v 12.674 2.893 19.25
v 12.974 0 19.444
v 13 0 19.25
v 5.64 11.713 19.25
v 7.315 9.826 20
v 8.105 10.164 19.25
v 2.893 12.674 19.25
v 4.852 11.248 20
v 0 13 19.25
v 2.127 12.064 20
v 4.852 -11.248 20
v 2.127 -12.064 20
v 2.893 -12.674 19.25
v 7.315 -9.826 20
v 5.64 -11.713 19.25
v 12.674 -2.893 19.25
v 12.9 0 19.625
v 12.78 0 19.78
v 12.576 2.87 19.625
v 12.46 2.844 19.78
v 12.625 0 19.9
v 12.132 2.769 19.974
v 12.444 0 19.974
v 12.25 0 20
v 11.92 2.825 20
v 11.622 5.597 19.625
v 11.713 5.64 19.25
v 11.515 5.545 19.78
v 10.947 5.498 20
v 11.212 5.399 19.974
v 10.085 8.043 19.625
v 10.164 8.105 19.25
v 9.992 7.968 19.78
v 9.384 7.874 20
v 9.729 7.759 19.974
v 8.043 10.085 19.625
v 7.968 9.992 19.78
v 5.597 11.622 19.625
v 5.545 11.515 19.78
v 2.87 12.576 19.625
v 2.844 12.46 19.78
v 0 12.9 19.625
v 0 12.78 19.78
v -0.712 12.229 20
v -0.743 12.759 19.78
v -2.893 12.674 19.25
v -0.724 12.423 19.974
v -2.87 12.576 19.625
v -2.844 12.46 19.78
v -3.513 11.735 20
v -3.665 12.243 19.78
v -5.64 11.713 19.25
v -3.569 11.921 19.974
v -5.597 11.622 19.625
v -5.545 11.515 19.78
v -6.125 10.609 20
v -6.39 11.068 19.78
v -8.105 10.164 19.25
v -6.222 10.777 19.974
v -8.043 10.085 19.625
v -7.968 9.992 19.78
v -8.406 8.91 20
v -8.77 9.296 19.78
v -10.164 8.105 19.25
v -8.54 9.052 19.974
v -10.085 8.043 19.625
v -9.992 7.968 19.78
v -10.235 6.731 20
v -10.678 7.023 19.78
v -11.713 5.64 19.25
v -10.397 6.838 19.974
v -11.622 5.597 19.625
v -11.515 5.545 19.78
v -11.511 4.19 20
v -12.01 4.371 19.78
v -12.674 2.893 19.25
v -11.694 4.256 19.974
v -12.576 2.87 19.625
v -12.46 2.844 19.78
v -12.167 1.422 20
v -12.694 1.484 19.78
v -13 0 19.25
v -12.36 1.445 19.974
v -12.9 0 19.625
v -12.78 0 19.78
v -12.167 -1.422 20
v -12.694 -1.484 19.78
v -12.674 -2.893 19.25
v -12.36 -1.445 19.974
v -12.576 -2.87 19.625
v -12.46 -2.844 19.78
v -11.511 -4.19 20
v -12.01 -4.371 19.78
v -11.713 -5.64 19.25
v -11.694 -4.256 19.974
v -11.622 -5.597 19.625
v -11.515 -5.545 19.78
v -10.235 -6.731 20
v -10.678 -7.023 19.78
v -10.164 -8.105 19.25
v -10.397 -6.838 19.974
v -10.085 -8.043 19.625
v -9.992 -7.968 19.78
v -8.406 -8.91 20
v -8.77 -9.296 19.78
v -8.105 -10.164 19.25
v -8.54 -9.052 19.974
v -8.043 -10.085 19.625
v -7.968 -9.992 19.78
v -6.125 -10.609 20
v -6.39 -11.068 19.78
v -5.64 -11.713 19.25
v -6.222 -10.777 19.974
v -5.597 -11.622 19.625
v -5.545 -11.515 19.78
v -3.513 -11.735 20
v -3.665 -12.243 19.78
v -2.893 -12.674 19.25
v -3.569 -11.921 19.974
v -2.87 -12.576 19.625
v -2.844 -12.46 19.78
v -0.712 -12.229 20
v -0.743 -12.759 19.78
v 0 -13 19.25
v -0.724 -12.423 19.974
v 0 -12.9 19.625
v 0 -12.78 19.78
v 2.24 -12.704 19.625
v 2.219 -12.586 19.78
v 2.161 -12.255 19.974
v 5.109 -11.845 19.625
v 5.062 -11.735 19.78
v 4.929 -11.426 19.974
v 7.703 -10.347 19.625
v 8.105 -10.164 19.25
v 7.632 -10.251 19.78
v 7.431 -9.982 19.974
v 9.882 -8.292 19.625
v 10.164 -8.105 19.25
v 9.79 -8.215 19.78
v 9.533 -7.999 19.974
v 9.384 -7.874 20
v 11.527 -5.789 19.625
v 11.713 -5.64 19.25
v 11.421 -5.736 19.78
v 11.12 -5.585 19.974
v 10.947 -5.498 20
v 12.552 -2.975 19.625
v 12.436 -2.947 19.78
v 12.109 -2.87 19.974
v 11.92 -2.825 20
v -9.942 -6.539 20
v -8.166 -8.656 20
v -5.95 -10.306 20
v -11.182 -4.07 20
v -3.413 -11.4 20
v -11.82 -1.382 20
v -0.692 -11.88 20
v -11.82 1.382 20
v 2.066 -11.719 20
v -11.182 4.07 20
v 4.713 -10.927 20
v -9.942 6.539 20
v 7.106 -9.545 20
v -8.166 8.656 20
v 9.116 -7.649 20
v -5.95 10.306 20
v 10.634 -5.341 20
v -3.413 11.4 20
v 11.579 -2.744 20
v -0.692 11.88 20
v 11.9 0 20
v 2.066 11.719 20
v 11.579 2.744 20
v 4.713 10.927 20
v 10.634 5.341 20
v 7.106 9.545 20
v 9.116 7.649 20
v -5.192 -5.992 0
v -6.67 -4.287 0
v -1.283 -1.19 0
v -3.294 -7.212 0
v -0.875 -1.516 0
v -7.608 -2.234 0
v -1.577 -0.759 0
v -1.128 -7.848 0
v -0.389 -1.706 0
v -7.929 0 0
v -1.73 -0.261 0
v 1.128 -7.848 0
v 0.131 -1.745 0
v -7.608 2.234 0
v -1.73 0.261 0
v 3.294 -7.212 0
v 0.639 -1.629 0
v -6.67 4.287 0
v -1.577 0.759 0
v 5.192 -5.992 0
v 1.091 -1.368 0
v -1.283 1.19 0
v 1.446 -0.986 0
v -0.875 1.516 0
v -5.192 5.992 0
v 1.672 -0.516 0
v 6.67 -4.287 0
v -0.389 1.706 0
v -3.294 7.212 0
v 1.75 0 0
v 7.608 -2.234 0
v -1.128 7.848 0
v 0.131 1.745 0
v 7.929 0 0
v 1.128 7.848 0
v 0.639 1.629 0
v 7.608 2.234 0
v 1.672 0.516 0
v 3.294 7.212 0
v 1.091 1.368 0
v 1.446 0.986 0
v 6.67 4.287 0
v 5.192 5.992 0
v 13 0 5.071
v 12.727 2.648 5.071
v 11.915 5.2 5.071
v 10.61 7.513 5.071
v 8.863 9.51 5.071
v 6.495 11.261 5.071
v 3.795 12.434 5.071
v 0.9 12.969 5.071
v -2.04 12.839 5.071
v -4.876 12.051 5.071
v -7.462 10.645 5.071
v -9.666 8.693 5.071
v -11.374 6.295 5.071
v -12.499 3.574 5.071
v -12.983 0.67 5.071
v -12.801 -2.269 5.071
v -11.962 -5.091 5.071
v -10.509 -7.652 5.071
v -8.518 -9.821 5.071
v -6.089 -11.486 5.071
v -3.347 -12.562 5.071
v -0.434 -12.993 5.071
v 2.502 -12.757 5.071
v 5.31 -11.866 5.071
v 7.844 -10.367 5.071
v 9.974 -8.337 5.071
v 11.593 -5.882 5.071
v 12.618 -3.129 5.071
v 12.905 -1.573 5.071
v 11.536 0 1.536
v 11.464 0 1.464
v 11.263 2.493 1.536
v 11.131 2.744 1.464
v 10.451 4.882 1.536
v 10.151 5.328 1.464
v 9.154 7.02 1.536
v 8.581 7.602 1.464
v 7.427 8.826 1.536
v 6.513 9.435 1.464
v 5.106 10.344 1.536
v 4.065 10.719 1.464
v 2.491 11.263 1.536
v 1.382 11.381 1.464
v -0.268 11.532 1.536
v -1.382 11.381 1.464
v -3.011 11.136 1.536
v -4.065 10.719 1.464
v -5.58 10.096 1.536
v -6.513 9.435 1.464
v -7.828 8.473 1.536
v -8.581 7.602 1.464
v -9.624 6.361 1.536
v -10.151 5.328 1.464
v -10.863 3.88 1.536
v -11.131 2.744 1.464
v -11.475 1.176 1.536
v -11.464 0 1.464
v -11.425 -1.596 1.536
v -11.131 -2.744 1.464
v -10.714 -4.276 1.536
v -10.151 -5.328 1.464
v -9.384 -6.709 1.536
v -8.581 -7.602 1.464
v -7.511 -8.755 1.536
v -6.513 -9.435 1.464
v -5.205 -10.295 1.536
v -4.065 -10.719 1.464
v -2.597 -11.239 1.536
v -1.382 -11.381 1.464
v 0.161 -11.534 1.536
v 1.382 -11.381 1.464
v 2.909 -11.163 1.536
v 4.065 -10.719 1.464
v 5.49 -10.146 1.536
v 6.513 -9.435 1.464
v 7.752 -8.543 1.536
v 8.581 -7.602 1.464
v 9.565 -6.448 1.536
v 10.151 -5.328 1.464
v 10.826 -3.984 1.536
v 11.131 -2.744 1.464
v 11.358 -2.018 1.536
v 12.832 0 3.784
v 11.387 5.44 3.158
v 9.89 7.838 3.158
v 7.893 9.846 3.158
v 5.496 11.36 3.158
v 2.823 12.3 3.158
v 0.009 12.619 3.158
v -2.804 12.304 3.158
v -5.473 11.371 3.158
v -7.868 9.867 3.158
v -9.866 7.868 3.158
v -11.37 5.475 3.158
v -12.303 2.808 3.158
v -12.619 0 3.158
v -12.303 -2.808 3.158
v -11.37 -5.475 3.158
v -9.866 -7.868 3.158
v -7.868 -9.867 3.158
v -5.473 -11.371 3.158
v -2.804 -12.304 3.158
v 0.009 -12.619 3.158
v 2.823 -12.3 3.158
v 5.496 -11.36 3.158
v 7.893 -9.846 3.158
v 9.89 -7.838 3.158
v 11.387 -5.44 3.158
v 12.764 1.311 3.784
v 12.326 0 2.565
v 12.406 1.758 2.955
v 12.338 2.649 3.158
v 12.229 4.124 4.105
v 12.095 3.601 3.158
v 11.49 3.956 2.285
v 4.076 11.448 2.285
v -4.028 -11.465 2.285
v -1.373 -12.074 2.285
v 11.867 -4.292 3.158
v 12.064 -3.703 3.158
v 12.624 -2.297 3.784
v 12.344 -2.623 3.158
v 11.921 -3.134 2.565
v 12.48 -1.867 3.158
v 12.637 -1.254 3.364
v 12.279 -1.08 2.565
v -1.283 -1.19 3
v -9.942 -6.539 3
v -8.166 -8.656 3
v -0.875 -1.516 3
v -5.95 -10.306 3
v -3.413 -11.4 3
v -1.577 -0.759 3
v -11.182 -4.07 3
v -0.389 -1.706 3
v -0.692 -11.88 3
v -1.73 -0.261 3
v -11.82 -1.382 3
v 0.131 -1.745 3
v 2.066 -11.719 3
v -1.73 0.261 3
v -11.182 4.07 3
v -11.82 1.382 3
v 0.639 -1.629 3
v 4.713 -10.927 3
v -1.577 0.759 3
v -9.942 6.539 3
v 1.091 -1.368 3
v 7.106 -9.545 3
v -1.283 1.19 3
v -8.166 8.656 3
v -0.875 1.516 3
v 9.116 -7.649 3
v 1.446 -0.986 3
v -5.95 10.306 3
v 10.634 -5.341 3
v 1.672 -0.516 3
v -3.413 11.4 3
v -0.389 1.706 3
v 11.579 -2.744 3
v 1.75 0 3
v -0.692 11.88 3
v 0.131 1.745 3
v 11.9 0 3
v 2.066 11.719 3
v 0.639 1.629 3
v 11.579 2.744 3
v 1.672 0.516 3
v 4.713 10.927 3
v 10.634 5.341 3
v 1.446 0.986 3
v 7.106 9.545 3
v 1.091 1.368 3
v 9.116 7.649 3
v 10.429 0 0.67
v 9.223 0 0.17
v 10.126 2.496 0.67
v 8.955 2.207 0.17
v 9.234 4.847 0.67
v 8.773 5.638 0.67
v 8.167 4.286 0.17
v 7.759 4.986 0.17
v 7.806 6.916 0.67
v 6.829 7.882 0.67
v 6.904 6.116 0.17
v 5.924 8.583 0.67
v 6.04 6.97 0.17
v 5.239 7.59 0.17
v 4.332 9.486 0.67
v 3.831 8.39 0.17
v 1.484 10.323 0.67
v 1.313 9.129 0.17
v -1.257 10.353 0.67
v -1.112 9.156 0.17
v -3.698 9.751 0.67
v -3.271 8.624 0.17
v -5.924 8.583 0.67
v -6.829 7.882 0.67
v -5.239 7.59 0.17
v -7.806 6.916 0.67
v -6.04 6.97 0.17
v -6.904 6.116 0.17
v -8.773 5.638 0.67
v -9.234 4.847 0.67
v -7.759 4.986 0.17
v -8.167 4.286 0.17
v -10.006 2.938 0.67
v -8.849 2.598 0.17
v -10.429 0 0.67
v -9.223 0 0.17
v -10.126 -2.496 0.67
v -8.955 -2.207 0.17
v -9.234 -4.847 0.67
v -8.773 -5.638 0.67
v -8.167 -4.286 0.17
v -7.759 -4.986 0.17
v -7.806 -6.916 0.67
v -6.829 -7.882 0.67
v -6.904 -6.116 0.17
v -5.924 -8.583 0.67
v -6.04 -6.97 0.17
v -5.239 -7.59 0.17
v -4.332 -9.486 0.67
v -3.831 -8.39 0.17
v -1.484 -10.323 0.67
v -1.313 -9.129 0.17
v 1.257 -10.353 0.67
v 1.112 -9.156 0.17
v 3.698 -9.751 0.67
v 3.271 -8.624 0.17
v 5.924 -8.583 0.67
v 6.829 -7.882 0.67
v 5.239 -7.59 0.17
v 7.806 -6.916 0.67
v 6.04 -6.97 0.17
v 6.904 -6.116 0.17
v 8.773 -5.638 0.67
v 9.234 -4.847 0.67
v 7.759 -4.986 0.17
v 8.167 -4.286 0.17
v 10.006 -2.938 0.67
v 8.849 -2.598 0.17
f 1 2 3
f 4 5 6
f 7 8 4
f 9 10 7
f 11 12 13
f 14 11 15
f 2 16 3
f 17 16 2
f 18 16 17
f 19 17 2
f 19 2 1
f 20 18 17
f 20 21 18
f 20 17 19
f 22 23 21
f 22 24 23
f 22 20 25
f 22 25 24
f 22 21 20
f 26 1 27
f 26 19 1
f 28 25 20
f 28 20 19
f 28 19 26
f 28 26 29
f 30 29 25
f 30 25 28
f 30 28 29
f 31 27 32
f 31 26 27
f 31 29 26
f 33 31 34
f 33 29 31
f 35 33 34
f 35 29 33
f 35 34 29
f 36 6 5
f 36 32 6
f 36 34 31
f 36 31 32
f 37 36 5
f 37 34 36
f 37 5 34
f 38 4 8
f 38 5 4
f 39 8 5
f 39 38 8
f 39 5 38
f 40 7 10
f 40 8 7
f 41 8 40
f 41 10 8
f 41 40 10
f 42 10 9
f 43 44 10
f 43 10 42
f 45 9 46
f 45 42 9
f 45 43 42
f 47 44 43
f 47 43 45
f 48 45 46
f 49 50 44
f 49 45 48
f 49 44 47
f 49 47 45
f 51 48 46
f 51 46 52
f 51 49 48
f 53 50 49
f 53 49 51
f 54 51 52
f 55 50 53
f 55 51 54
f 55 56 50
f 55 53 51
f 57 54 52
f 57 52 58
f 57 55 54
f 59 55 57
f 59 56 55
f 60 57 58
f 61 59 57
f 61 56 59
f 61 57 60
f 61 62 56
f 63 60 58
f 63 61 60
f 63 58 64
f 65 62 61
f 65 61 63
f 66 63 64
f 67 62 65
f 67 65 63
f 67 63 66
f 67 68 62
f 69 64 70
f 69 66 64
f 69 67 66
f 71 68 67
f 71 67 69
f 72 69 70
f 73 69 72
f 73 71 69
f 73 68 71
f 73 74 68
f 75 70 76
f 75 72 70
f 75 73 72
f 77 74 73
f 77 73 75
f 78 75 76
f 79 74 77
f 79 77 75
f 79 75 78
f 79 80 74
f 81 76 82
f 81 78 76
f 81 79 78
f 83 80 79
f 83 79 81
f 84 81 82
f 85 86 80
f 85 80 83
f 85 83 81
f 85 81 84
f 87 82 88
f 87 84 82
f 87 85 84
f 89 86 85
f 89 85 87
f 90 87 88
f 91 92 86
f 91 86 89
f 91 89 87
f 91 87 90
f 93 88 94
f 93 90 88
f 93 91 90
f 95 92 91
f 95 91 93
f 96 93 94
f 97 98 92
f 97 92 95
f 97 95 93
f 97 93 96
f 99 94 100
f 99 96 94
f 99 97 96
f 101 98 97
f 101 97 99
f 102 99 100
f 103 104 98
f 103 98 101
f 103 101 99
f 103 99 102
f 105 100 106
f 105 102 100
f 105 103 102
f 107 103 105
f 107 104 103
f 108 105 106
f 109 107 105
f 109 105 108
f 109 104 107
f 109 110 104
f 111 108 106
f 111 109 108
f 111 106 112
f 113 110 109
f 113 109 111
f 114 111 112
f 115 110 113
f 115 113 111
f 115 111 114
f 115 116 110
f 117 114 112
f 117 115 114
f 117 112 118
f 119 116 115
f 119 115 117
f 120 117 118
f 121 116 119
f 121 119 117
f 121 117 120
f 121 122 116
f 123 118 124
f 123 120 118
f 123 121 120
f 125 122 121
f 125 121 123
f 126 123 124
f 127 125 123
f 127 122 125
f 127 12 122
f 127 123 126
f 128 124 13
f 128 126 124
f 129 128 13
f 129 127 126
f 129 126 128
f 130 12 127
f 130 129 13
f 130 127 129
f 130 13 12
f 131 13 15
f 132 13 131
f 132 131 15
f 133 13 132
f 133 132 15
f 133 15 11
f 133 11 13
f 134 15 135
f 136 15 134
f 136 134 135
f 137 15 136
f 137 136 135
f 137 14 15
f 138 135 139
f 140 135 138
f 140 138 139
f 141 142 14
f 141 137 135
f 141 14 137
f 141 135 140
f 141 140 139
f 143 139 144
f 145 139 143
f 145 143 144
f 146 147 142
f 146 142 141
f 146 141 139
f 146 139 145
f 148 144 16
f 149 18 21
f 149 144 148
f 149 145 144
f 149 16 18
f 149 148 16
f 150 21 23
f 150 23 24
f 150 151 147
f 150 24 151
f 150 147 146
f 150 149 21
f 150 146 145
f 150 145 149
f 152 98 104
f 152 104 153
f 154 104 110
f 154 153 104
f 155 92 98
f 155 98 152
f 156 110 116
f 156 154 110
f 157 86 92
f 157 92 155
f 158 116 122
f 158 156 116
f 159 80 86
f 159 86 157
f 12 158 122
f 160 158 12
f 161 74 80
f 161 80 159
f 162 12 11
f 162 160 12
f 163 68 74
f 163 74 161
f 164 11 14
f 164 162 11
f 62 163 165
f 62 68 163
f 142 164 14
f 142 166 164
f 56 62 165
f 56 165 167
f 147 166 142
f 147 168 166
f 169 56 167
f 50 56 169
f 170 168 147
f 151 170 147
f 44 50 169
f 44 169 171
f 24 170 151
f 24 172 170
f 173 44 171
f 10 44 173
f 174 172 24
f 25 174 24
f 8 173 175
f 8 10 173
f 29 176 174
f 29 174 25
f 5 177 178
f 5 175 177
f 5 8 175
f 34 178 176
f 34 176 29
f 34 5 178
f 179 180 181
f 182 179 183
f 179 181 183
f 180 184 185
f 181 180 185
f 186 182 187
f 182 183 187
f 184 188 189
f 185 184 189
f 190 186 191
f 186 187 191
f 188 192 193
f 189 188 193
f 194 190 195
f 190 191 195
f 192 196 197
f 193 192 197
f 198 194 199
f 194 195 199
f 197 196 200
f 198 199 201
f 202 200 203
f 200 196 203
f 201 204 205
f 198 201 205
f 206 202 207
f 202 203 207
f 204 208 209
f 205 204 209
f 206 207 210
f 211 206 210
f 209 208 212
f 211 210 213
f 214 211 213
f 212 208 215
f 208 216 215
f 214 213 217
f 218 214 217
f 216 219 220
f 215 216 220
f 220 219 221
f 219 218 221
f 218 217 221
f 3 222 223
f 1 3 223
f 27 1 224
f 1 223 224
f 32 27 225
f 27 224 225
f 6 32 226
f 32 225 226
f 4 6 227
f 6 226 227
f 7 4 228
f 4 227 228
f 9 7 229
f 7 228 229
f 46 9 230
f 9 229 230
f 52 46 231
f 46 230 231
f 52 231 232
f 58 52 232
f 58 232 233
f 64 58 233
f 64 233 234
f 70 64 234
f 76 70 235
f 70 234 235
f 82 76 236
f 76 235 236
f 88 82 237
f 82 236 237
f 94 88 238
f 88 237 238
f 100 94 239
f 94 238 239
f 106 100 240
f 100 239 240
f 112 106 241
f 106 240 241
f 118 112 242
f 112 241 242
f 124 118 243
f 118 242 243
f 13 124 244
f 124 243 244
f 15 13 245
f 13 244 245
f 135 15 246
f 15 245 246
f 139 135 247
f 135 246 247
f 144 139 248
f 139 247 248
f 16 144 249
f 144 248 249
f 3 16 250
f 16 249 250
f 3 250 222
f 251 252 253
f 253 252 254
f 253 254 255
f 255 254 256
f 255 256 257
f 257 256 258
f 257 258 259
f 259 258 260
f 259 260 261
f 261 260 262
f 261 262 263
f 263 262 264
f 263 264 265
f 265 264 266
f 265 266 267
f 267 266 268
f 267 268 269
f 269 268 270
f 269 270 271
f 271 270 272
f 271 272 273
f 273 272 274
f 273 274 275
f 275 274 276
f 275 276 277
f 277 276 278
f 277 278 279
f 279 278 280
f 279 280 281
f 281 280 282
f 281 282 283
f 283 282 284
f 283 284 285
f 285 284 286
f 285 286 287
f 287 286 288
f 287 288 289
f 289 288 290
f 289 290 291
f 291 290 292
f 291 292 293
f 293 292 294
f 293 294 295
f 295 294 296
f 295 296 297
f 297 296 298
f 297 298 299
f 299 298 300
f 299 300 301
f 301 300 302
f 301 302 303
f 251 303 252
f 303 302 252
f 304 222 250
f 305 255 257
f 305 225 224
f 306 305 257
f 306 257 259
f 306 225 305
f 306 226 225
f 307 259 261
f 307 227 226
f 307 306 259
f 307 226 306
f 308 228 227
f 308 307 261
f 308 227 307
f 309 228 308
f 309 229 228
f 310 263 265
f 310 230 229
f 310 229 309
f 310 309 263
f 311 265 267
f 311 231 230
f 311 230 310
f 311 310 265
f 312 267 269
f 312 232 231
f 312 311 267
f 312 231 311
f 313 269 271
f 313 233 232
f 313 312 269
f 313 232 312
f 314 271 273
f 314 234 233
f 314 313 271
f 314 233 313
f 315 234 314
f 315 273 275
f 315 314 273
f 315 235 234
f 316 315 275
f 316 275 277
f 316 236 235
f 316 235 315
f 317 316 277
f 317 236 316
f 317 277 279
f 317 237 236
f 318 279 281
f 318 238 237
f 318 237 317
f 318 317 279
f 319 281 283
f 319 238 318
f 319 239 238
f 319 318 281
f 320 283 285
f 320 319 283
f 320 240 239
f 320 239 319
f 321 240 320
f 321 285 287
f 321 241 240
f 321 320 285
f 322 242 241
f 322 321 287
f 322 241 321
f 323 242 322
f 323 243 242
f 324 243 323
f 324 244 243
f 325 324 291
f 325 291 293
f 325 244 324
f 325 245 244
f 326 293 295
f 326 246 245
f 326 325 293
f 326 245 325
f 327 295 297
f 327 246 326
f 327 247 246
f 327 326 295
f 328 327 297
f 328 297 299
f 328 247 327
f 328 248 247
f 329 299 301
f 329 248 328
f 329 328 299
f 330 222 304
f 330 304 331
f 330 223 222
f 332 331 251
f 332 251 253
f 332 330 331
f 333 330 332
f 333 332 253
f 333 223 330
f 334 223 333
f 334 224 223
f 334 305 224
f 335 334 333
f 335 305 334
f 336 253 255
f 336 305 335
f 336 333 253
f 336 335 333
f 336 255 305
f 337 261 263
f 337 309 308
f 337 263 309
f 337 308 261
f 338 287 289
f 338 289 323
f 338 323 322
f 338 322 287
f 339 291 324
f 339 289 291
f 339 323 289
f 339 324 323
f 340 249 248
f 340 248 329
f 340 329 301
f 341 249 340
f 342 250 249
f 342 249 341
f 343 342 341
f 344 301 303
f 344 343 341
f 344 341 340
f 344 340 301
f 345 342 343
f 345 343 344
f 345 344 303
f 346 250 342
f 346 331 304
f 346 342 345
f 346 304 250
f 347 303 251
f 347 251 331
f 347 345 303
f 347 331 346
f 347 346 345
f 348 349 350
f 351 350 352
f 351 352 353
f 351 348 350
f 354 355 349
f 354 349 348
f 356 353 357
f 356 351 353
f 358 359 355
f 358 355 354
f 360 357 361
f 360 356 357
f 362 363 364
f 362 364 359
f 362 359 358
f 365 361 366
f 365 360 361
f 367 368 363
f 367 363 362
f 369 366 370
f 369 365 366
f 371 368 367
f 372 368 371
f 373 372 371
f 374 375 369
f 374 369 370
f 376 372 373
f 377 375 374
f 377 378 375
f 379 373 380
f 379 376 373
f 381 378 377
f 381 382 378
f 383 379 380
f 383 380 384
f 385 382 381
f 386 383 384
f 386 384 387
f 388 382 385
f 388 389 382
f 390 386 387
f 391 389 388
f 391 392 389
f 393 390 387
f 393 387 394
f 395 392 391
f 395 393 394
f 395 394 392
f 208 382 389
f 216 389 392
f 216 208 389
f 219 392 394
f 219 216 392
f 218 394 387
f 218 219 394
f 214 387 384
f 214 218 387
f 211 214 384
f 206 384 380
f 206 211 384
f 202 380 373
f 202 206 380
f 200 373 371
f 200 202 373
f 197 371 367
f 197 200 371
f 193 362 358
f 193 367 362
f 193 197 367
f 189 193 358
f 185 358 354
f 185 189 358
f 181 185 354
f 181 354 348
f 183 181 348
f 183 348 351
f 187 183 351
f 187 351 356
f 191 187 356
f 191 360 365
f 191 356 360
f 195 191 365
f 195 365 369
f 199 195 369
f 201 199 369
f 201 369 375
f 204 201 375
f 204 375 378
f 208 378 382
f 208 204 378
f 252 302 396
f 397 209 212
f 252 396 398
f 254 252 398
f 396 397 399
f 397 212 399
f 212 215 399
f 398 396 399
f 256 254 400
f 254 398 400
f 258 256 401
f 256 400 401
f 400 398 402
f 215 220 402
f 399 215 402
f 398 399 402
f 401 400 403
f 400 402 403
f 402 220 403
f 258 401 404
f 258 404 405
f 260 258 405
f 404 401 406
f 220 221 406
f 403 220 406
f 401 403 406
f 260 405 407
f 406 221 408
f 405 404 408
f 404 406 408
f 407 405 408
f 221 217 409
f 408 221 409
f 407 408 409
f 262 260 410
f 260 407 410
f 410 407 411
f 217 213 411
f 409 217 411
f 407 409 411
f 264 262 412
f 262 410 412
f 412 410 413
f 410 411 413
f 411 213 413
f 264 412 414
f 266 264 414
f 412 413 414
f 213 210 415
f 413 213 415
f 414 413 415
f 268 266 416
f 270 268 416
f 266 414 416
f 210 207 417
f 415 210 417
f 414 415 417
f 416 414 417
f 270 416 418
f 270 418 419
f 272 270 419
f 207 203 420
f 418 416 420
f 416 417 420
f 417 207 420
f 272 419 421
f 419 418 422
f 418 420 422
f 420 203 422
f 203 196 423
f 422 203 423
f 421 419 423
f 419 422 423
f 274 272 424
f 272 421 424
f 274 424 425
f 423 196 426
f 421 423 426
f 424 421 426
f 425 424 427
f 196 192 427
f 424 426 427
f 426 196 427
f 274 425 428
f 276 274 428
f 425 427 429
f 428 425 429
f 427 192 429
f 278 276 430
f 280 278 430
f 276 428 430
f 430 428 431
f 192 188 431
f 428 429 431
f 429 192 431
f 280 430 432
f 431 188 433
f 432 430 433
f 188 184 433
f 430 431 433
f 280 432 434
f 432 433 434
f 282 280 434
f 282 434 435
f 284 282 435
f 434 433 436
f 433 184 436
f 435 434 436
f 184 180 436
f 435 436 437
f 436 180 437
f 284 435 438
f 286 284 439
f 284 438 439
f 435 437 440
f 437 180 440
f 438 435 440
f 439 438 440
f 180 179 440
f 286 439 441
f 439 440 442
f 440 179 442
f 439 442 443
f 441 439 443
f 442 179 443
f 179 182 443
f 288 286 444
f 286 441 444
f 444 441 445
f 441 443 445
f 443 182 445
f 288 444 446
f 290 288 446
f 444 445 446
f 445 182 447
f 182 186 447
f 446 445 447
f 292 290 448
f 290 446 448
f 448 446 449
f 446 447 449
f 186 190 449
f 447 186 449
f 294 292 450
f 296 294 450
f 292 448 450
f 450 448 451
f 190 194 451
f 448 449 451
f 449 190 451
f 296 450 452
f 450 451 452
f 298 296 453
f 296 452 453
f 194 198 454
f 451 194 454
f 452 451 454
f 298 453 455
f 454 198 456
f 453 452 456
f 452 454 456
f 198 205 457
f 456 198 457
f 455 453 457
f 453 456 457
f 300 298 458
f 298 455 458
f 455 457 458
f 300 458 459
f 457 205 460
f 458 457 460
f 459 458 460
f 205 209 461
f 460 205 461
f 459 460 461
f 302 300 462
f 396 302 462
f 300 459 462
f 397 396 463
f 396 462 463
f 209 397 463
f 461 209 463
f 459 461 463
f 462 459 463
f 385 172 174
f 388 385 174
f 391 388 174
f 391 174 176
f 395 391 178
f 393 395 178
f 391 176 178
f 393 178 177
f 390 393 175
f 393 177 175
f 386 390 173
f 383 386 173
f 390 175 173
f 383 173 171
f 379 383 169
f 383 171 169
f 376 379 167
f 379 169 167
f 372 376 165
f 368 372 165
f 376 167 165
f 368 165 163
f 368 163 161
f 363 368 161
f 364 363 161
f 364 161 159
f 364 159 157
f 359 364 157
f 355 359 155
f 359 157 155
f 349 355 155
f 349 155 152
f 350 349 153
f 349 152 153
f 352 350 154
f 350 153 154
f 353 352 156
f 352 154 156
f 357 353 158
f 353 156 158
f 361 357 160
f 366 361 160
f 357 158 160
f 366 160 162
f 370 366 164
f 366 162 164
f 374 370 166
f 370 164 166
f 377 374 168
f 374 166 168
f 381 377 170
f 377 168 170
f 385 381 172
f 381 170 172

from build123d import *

# Parameters (mm, degrees)
F0_R     = 13
F1_DEPTH = 20
F2_R     = 11.9
F3_DEPTH = 17
F4_R     = 1.75
F5_DEPTH = 4.1
F6_SIZE  = 3
F7_R     = 5
F8_R     = 0.75


with BuildPart() as f1:
    # F0 (on Top) → F1 (new body)
    with BuildSketch(Plane.XY):
        Circle(F0_R)
    extrude(amount=F1_DEPTH)

    # F2 (on face) → F3 (cut)
    with BuildSketch(Plane.XY.offset(20)):
        Circle(F2_R)
    extrude(amount=-F3_DEPTH, mode=Mode.SUBTRACT)

    # F4 (on Top) → F5 (cut)
    with BuildSketch(Plane.XY):
        Circle(F4_R)
    extrude(amount=F5_DEPTH, mode=Mode.SUBTRACT)

    # F6
    f6_edges = [f1.edges().sort_by_distance(p)[0] for p in [
        (-13, 0, 0),
    ]]
    chamfer(f6_edges, length=F6_SIZE)

    # F7
    f7_edges = [f1.edges().sort_by_distance(p)[0] for p in [
        (-10, 0, 0),
        (-13, 0, 3),
    ]]
    fillet(f7_edges, radius=F7_R)

    # F8
    f8_edges = [f1.edges().sort_by_distance(p)[0] for p in [
        (-13, 0, 20),
    ]]
    fillet(f8_edges, radius=F8_R)


solid = f1.part
